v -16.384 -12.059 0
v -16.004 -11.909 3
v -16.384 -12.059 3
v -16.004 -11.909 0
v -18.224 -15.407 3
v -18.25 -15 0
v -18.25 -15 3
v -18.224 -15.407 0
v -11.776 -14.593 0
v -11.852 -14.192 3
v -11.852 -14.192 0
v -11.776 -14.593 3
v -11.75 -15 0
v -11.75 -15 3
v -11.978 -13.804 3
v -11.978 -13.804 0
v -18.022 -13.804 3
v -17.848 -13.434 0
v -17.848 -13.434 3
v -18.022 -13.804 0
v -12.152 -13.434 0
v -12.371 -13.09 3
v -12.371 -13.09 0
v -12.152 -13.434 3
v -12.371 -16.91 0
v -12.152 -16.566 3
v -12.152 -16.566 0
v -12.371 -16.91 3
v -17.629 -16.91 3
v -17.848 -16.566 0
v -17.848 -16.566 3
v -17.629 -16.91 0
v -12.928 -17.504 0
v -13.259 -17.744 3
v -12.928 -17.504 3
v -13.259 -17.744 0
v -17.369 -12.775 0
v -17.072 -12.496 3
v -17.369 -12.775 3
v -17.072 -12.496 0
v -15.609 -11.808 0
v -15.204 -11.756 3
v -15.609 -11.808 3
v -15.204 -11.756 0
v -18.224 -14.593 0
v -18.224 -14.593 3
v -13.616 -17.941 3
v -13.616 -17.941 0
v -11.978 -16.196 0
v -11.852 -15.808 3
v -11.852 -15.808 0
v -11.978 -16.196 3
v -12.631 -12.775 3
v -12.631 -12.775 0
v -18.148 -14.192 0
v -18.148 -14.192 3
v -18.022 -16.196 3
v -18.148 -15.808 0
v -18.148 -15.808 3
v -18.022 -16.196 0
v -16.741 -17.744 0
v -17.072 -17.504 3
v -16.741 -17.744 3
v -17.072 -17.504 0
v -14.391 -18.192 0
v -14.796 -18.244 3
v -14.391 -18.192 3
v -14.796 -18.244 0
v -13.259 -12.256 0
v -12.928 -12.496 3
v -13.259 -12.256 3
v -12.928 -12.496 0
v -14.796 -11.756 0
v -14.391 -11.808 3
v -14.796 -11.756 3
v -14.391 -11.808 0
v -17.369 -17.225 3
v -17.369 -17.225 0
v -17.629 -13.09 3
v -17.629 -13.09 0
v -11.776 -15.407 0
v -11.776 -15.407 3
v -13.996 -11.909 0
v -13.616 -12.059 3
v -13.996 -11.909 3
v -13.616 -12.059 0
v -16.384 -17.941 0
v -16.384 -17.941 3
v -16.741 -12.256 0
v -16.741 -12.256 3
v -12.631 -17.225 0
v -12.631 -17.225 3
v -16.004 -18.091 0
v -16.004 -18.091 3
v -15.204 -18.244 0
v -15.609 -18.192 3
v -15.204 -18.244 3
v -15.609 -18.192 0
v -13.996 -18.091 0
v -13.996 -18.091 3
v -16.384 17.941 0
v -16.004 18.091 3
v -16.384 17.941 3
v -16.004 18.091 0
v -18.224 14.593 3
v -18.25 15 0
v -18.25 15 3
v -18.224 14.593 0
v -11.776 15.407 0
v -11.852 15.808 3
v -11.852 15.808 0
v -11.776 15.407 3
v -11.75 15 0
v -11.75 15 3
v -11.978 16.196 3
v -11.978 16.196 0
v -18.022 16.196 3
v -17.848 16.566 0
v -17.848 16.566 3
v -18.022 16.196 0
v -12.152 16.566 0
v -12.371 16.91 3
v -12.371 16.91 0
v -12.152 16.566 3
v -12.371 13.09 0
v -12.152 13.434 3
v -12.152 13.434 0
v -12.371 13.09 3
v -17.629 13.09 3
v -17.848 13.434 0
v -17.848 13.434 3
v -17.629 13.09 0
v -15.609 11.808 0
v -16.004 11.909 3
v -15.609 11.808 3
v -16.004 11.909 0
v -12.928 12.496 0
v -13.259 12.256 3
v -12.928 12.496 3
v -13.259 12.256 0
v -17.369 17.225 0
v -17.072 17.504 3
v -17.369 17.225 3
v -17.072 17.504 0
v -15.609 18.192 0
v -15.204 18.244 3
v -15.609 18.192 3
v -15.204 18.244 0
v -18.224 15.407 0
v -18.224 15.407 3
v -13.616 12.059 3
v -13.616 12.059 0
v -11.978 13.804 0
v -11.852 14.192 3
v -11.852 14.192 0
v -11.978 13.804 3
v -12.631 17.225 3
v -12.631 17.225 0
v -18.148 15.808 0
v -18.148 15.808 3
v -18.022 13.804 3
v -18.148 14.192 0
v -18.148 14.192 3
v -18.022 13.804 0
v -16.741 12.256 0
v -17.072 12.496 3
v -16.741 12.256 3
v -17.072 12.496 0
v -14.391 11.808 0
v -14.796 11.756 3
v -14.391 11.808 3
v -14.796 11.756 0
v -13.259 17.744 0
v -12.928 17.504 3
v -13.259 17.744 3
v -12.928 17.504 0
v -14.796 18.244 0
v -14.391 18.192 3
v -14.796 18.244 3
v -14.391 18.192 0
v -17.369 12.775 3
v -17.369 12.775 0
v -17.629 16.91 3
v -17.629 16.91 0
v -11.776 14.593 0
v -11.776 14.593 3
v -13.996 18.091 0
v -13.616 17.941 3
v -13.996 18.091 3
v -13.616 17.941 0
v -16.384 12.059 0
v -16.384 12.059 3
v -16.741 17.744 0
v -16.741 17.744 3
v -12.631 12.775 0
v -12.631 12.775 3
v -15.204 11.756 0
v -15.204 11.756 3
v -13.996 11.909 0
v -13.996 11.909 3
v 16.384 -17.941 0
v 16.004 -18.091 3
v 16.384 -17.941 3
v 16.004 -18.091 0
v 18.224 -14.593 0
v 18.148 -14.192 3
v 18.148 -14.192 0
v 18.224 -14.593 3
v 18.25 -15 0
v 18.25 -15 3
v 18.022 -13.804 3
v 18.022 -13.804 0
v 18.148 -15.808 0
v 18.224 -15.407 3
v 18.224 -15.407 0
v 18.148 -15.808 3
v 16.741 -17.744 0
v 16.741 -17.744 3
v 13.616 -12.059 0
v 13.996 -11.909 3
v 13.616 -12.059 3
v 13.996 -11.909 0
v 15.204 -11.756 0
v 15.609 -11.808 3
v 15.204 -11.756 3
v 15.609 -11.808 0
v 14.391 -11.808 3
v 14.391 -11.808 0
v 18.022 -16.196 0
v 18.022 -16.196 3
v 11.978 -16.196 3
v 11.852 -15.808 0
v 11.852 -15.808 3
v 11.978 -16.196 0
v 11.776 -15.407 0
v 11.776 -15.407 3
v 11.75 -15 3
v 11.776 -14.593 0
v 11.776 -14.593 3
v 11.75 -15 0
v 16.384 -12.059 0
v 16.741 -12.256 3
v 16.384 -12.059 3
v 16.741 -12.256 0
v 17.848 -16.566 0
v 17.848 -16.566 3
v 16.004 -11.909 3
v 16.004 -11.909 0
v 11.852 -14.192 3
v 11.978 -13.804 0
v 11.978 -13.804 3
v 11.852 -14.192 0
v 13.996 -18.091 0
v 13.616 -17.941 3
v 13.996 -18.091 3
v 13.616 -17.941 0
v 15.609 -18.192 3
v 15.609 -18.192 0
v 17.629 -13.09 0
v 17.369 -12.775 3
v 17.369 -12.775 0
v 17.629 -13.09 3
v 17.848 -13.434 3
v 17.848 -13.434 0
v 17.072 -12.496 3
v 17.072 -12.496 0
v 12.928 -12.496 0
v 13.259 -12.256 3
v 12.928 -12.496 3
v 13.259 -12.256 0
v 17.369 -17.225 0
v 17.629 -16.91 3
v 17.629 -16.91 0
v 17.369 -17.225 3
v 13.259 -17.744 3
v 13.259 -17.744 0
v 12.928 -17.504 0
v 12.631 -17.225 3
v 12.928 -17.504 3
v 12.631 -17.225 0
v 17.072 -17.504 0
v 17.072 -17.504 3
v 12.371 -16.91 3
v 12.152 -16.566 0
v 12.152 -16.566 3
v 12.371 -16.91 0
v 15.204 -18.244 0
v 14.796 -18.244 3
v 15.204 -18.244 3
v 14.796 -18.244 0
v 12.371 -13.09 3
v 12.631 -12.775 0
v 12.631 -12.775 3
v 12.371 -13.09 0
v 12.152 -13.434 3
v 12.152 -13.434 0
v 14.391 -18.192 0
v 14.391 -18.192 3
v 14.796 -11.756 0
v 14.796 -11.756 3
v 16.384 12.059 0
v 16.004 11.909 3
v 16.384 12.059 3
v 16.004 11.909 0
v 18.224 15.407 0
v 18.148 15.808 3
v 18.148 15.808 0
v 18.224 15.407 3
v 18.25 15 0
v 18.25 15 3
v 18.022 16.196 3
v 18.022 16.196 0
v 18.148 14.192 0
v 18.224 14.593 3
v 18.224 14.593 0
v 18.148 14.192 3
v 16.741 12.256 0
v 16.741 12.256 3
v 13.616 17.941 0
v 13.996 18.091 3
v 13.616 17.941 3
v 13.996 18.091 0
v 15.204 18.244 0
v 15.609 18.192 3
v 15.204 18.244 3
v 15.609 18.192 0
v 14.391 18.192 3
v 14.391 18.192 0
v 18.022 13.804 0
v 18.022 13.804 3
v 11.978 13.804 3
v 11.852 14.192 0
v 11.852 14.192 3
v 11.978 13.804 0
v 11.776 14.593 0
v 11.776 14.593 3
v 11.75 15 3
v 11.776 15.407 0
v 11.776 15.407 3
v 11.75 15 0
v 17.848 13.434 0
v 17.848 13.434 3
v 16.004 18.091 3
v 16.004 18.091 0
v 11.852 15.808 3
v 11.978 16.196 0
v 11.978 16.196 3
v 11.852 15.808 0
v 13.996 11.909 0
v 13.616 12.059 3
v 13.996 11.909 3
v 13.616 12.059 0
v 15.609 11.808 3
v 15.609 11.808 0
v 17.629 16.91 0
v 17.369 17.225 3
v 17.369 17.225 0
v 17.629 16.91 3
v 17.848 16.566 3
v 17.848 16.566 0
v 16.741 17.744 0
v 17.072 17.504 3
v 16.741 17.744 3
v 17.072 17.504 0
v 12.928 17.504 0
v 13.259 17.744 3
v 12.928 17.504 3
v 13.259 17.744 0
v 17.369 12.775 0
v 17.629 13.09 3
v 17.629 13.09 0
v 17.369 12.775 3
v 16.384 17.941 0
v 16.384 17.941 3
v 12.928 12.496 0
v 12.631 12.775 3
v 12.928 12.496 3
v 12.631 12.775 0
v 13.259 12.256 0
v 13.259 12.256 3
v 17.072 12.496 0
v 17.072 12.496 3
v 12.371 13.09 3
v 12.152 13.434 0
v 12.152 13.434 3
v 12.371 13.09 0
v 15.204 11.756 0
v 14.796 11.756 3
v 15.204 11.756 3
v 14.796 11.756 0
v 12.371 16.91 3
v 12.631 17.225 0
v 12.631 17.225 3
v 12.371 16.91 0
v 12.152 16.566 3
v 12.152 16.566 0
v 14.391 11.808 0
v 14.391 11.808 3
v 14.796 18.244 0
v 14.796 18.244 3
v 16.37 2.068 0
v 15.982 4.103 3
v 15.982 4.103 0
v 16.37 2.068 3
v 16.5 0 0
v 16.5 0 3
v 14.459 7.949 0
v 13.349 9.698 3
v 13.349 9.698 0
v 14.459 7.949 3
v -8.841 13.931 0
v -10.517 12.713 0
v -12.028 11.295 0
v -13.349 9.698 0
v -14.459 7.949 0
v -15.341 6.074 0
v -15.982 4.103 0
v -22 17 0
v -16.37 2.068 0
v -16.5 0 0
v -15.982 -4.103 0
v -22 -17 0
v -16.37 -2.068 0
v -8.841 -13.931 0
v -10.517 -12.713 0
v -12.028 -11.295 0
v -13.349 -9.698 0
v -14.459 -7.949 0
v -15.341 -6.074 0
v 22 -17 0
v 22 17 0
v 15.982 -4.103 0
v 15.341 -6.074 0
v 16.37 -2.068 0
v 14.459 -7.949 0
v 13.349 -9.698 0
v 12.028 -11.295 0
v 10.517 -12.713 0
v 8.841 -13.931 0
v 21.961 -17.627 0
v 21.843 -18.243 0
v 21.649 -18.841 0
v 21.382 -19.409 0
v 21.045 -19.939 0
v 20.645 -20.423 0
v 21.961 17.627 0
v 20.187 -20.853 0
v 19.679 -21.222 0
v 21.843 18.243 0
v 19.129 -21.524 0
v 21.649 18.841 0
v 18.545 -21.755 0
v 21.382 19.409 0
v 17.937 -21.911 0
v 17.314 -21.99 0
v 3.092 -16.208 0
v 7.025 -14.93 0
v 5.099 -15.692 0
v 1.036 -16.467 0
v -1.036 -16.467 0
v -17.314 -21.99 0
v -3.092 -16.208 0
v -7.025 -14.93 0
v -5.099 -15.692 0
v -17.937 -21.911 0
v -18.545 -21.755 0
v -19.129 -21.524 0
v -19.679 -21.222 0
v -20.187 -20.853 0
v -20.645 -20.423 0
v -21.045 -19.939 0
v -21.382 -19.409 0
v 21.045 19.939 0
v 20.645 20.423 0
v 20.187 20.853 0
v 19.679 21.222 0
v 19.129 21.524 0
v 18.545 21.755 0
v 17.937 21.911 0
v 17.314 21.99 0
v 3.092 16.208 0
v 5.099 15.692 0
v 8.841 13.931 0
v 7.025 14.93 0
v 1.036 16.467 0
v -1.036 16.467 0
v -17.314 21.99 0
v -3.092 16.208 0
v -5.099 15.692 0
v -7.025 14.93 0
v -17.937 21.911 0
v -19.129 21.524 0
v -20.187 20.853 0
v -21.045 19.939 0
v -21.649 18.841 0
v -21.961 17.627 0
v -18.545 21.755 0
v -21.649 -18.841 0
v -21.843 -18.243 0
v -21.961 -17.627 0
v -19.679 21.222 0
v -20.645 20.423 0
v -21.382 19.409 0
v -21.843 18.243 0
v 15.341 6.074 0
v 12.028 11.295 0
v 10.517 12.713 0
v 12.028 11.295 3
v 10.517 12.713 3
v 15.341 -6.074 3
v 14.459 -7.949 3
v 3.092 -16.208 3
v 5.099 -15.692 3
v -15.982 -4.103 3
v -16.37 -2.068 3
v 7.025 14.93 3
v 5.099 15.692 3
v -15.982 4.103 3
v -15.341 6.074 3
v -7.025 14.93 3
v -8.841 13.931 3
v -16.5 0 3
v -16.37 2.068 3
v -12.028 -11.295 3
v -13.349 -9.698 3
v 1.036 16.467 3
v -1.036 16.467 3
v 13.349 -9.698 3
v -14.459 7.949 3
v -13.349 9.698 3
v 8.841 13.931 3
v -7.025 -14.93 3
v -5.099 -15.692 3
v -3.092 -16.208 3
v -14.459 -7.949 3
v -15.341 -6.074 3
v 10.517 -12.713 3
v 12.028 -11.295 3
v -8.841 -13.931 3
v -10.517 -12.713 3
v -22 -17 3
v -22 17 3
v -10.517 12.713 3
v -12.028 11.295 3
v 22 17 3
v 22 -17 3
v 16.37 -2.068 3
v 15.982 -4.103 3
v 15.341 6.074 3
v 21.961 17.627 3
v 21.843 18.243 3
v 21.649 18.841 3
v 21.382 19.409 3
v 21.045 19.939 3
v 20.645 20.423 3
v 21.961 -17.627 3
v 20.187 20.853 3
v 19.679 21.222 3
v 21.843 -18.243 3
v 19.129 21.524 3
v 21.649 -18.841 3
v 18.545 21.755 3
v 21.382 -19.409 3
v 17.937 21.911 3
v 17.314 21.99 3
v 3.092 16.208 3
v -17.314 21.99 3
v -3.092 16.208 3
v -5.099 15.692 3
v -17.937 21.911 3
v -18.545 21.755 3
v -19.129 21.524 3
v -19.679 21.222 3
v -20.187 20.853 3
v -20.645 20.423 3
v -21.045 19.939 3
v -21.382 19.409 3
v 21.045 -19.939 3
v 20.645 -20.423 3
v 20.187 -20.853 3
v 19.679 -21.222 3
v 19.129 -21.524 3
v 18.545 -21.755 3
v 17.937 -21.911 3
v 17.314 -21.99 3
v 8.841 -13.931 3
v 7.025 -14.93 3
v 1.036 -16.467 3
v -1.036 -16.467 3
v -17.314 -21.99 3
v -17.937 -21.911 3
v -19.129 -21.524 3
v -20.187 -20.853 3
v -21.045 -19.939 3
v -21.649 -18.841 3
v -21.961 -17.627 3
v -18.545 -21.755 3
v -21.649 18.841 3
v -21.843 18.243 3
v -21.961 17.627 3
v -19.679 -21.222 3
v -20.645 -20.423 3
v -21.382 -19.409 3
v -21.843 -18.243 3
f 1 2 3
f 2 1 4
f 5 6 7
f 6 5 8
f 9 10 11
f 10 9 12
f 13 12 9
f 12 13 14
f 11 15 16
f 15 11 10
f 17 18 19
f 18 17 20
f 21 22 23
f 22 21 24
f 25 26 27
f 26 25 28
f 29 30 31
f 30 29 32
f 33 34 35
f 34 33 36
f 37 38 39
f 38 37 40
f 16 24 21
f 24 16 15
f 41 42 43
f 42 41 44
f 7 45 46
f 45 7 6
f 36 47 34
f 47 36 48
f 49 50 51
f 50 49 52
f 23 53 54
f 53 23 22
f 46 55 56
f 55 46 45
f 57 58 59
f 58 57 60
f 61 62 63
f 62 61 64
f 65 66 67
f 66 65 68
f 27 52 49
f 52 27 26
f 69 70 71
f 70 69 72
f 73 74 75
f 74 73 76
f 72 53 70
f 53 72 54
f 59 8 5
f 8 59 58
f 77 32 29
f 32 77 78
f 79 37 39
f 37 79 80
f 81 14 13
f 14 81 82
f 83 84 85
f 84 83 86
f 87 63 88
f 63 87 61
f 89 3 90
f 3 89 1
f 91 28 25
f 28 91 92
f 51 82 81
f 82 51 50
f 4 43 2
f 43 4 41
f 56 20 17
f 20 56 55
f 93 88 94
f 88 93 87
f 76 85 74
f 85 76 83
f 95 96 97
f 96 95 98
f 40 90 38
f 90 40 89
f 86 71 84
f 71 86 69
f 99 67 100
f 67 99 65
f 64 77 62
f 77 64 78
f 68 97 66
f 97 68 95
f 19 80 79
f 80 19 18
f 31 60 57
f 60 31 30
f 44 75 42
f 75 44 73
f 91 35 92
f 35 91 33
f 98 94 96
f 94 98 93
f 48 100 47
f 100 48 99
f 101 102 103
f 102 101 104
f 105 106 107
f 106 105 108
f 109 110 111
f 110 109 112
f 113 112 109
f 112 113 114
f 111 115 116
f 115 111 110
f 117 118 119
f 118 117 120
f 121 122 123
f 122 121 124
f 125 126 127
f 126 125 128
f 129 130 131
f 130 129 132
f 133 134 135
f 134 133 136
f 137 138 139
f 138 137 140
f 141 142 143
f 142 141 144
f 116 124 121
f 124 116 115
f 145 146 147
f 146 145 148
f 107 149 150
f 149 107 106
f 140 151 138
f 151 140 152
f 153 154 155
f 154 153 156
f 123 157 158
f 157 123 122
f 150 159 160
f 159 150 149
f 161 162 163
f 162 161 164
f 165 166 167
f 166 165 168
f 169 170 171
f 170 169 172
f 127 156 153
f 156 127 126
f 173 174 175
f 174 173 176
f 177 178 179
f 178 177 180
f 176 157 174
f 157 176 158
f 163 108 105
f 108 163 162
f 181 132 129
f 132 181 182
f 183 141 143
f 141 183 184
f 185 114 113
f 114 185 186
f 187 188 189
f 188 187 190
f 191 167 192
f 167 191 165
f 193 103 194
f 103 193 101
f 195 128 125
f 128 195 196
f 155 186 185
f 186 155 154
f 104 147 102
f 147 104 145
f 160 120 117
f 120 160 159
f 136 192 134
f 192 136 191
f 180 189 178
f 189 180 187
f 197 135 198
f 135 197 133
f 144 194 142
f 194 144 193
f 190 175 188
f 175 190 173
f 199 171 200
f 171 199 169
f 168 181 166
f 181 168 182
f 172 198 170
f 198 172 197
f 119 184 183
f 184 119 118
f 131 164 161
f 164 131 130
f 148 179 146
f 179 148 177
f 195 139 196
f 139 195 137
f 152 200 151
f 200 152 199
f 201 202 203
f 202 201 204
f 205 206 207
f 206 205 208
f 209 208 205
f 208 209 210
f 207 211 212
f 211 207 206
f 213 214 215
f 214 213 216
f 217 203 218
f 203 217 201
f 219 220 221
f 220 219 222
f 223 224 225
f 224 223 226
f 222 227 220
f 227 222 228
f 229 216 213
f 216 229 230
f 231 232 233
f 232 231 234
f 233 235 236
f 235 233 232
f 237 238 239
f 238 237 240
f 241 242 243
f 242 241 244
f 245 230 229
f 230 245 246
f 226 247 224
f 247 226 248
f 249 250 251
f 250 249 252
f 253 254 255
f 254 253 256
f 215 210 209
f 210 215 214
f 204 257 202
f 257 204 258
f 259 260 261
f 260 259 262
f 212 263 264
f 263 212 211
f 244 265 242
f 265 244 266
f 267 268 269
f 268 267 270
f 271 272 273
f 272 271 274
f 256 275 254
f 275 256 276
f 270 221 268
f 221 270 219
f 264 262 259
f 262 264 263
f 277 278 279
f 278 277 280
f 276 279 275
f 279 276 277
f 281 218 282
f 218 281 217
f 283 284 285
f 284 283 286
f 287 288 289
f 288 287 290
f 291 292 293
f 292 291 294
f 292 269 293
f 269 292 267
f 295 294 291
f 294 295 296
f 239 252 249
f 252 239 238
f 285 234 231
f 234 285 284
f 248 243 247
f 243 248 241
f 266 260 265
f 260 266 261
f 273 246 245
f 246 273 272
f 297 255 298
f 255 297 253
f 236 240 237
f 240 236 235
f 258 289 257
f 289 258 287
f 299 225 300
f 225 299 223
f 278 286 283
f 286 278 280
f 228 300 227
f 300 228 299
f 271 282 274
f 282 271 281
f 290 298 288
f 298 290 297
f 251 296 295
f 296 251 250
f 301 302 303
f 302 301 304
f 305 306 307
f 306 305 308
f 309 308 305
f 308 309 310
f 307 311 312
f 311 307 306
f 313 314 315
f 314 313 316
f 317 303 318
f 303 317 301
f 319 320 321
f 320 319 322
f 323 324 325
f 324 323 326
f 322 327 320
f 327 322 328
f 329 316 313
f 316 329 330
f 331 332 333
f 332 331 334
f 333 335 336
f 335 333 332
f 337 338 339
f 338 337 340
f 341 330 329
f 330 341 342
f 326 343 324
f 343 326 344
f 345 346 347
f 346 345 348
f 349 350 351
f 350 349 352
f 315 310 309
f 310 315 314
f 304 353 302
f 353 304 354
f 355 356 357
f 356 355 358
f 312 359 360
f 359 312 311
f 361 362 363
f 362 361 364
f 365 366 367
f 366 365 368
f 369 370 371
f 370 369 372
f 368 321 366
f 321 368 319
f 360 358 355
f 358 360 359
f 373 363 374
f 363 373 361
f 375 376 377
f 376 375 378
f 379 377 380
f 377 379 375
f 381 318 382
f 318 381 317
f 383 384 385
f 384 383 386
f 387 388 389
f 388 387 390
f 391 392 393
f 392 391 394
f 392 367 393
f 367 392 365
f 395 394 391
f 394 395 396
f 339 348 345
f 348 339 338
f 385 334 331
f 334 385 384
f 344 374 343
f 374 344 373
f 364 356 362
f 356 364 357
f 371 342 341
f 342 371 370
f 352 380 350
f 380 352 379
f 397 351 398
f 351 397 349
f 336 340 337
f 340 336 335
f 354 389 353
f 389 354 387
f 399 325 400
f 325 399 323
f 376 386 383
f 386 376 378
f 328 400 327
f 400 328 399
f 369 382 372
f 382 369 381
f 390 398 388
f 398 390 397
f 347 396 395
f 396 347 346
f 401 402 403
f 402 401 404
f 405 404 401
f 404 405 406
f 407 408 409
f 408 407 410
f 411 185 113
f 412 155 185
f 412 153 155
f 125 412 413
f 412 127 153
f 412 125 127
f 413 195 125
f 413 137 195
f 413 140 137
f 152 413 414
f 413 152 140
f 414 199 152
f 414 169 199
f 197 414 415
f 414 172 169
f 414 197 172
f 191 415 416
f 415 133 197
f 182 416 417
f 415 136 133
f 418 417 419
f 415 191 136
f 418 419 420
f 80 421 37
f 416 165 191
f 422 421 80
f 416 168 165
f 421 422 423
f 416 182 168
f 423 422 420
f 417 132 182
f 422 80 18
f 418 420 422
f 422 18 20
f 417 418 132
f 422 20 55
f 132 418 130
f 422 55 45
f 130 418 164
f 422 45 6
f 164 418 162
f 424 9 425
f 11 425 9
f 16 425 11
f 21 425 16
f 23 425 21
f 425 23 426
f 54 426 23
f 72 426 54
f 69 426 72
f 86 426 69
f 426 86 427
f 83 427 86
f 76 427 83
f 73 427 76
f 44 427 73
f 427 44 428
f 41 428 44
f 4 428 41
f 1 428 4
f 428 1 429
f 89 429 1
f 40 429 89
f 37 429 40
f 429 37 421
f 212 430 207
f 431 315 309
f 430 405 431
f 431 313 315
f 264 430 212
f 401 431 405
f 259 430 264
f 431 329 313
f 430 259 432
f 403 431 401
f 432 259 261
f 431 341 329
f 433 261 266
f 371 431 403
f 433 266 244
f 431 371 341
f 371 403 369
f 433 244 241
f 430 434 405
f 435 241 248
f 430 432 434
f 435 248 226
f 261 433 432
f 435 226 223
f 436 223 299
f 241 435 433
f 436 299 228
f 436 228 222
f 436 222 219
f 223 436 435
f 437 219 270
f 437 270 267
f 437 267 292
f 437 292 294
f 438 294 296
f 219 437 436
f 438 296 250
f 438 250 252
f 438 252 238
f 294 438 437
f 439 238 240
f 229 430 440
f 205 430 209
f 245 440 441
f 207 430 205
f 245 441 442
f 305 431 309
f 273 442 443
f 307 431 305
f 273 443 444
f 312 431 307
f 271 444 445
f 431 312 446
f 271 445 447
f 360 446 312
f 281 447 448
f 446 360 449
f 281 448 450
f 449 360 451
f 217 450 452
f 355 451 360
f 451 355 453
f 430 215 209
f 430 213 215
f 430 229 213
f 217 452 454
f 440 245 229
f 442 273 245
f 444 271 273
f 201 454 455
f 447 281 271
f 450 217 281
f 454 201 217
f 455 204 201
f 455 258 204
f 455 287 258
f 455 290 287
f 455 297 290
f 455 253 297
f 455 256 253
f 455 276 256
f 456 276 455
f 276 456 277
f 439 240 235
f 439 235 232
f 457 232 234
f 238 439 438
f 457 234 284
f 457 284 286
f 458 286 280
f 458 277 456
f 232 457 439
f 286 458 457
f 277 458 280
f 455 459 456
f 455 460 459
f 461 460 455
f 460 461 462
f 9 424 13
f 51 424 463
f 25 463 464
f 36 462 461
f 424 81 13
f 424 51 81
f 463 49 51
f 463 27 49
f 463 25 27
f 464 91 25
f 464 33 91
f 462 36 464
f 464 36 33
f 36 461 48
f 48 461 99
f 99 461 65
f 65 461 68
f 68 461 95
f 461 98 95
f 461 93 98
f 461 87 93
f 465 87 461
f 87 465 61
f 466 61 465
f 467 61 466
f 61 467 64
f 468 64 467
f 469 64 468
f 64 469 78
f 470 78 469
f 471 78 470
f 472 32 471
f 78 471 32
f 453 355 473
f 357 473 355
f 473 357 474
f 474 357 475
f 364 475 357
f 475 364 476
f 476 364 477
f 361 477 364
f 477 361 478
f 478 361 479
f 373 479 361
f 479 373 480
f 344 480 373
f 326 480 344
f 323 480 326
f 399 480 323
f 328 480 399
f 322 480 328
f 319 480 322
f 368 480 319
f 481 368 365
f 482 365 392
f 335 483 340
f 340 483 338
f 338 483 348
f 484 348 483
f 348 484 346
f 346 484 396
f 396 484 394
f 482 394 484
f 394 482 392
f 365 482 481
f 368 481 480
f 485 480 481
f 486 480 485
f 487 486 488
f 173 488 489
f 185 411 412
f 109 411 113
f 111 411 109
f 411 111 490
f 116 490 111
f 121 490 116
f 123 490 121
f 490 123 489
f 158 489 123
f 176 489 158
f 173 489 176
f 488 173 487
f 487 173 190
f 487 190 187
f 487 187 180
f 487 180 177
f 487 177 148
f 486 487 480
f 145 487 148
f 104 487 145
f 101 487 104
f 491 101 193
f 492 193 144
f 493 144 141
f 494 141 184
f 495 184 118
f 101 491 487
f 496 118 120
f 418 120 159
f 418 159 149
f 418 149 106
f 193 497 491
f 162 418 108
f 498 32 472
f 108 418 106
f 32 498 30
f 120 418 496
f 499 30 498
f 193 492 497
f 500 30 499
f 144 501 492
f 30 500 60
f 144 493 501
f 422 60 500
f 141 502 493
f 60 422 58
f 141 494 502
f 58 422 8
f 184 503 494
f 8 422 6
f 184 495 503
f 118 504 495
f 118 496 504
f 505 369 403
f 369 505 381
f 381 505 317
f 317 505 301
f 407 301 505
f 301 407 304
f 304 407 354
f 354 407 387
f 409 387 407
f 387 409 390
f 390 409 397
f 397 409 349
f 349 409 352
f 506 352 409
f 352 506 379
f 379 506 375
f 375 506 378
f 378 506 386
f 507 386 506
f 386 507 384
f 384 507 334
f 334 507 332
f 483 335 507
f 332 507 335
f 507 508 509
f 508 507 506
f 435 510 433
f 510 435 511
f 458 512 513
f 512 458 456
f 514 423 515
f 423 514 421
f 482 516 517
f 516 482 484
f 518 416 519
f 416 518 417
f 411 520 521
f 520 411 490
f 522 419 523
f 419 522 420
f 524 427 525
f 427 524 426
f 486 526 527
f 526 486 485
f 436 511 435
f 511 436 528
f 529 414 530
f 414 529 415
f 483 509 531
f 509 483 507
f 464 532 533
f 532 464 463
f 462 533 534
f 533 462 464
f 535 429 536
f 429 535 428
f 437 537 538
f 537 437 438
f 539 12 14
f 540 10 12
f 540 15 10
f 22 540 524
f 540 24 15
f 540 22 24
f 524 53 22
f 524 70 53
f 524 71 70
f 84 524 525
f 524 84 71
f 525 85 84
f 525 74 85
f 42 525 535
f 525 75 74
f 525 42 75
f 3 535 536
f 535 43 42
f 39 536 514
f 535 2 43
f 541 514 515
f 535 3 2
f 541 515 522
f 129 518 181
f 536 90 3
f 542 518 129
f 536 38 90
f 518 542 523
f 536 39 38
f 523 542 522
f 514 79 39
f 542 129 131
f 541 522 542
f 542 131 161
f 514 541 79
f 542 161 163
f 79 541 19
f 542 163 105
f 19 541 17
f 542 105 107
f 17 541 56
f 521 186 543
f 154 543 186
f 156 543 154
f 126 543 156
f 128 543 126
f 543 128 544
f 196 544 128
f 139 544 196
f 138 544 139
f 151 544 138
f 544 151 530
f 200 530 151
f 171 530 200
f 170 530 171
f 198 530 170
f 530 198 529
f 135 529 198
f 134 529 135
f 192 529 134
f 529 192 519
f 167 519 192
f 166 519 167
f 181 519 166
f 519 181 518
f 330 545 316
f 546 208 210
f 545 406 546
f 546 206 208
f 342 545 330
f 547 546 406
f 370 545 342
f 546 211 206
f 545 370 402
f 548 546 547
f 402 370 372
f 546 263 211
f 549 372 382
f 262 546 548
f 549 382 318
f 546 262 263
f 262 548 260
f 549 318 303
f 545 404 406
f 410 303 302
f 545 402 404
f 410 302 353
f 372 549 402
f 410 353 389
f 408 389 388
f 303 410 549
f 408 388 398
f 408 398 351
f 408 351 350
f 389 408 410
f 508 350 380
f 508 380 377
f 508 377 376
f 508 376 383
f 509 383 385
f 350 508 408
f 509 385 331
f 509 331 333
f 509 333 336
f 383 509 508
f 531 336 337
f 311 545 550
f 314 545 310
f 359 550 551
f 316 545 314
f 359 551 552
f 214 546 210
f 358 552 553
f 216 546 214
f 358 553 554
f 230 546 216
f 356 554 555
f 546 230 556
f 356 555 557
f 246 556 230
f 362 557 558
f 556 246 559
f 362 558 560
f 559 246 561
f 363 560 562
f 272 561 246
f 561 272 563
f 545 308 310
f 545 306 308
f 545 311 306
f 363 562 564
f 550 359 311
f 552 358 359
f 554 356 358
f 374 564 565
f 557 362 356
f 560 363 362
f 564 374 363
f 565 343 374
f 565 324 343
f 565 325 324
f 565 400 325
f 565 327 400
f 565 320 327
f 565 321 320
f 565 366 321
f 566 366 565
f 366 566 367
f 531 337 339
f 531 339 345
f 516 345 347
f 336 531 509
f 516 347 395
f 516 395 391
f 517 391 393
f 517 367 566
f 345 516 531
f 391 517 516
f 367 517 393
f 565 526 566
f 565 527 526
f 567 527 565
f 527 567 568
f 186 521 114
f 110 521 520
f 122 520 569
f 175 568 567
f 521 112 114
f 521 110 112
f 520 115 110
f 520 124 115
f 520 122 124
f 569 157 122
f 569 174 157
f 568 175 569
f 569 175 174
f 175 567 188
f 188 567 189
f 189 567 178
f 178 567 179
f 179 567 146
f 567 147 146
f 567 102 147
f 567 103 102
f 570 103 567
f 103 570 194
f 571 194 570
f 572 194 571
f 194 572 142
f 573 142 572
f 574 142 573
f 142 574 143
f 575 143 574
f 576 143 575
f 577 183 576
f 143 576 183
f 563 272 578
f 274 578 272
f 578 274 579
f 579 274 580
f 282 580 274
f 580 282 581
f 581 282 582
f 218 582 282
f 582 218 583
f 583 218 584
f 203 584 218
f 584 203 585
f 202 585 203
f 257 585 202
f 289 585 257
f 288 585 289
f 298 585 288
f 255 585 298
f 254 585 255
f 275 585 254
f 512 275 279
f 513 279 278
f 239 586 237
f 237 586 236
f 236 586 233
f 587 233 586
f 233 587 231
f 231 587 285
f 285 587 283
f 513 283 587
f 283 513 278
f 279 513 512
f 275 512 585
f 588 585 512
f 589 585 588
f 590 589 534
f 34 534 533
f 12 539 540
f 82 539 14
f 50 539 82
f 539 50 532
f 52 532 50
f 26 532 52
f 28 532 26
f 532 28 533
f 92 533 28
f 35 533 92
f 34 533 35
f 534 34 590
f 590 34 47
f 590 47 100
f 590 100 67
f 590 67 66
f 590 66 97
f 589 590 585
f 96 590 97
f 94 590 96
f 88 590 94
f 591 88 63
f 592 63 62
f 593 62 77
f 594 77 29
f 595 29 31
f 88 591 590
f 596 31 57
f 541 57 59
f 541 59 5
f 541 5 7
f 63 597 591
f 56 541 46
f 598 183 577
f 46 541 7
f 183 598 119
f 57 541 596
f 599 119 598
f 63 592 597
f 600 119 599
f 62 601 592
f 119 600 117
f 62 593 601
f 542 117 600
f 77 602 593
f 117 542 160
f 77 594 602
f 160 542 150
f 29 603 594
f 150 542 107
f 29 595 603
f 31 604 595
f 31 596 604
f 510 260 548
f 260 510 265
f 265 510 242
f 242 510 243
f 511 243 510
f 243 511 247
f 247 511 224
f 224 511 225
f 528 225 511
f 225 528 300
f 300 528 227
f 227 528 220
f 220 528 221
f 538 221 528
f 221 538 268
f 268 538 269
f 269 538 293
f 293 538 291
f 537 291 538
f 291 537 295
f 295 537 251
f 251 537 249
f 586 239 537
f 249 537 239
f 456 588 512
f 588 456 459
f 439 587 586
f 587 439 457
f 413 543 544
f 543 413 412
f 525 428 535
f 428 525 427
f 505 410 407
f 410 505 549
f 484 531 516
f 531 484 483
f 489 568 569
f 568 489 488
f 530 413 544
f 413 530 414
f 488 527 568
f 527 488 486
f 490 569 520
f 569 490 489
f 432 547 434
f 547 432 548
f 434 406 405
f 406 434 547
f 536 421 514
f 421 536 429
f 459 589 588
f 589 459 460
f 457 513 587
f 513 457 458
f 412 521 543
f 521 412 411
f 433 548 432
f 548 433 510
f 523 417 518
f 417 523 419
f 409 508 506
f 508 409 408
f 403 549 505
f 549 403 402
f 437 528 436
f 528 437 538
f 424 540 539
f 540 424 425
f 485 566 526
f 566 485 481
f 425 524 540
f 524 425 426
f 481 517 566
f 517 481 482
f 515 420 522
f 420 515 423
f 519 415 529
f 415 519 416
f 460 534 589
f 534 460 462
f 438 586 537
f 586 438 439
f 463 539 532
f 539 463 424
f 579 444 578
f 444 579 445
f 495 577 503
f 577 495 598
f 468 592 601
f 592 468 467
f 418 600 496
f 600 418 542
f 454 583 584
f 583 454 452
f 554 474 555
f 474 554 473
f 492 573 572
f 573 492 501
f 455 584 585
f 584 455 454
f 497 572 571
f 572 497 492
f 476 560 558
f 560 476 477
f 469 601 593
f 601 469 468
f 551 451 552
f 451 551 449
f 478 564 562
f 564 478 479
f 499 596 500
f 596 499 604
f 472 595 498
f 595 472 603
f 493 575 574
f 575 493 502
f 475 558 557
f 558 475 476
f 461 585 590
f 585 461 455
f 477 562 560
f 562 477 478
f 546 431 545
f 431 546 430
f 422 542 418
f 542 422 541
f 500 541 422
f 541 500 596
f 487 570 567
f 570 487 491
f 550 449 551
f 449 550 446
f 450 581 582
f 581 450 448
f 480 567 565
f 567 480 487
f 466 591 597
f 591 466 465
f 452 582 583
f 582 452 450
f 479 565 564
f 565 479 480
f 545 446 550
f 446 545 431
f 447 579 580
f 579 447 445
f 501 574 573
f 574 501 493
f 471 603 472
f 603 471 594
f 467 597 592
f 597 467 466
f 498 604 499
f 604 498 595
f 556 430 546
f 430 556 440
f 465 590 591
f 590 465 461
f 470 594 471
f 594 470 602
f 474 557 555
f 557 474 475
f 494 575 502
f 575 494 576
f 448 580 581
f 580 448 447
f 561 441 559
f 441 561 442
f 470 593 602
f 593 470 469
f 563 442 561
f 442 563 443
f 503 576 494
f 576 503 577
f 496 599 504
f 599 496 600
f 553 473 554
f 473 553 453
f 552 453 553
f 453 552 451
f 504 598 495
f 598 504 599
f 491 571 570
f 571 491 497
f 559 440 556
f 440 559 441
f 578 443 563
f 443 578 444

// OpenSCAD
$fn = 50;

difference() {
	union() {
		hull() {
			translate(v = [-17.0, 17.0, 0]) {
				cylinder(h = 3, r = 5);
			}
			translate(v = [17.0, 17.0, 0]) {
				cylinder(h = 3, r = 5);
			}
			translate(v = [-17.0, -17.0, 0]) {
				cylinder(h = 3, r = 5);
			}
			translate(v = [17.0, -17.0, 0]) {
				cylinder(h = 3, r = 5);
			}
		}
	}
	union() {
		translate(v = [-15.0, -15.0, -100.0]) {
			cylinder(h = 200, r = 3.25);
		}
		translate(v = [-15.0, 15.0, -100.0]) {
			cylinder(h = 200, r = 3.25);
		}
		translate(v = [15.0, -15.0, -100.0]) {
			cylinder(h = 200, r = 3.25);
		}
		translate(v = [15.0, 15.0, -100.0]) {
			cylinder(h = 200, r = 3.25);
		}
		translate(v = [-15.0, -15.0, -100.0]) {
			cylinder(h = 200, r = 1.8);
		}
		translate(v = [-15.0, 15.0, -100.0]) {
			cylinder(h = 200, r = 1.8);
		}
		translate(v = [15.0, -15.0, -100.0]) {
			cylinder(h = 200, r = 1.8);
		}
		translate(v = [15.0, 15.0, -100.0]) {
			cylinder(h = 200, r = 1.8);
		}
		cylinder(h = 3, r = 16.5);
	}
}
